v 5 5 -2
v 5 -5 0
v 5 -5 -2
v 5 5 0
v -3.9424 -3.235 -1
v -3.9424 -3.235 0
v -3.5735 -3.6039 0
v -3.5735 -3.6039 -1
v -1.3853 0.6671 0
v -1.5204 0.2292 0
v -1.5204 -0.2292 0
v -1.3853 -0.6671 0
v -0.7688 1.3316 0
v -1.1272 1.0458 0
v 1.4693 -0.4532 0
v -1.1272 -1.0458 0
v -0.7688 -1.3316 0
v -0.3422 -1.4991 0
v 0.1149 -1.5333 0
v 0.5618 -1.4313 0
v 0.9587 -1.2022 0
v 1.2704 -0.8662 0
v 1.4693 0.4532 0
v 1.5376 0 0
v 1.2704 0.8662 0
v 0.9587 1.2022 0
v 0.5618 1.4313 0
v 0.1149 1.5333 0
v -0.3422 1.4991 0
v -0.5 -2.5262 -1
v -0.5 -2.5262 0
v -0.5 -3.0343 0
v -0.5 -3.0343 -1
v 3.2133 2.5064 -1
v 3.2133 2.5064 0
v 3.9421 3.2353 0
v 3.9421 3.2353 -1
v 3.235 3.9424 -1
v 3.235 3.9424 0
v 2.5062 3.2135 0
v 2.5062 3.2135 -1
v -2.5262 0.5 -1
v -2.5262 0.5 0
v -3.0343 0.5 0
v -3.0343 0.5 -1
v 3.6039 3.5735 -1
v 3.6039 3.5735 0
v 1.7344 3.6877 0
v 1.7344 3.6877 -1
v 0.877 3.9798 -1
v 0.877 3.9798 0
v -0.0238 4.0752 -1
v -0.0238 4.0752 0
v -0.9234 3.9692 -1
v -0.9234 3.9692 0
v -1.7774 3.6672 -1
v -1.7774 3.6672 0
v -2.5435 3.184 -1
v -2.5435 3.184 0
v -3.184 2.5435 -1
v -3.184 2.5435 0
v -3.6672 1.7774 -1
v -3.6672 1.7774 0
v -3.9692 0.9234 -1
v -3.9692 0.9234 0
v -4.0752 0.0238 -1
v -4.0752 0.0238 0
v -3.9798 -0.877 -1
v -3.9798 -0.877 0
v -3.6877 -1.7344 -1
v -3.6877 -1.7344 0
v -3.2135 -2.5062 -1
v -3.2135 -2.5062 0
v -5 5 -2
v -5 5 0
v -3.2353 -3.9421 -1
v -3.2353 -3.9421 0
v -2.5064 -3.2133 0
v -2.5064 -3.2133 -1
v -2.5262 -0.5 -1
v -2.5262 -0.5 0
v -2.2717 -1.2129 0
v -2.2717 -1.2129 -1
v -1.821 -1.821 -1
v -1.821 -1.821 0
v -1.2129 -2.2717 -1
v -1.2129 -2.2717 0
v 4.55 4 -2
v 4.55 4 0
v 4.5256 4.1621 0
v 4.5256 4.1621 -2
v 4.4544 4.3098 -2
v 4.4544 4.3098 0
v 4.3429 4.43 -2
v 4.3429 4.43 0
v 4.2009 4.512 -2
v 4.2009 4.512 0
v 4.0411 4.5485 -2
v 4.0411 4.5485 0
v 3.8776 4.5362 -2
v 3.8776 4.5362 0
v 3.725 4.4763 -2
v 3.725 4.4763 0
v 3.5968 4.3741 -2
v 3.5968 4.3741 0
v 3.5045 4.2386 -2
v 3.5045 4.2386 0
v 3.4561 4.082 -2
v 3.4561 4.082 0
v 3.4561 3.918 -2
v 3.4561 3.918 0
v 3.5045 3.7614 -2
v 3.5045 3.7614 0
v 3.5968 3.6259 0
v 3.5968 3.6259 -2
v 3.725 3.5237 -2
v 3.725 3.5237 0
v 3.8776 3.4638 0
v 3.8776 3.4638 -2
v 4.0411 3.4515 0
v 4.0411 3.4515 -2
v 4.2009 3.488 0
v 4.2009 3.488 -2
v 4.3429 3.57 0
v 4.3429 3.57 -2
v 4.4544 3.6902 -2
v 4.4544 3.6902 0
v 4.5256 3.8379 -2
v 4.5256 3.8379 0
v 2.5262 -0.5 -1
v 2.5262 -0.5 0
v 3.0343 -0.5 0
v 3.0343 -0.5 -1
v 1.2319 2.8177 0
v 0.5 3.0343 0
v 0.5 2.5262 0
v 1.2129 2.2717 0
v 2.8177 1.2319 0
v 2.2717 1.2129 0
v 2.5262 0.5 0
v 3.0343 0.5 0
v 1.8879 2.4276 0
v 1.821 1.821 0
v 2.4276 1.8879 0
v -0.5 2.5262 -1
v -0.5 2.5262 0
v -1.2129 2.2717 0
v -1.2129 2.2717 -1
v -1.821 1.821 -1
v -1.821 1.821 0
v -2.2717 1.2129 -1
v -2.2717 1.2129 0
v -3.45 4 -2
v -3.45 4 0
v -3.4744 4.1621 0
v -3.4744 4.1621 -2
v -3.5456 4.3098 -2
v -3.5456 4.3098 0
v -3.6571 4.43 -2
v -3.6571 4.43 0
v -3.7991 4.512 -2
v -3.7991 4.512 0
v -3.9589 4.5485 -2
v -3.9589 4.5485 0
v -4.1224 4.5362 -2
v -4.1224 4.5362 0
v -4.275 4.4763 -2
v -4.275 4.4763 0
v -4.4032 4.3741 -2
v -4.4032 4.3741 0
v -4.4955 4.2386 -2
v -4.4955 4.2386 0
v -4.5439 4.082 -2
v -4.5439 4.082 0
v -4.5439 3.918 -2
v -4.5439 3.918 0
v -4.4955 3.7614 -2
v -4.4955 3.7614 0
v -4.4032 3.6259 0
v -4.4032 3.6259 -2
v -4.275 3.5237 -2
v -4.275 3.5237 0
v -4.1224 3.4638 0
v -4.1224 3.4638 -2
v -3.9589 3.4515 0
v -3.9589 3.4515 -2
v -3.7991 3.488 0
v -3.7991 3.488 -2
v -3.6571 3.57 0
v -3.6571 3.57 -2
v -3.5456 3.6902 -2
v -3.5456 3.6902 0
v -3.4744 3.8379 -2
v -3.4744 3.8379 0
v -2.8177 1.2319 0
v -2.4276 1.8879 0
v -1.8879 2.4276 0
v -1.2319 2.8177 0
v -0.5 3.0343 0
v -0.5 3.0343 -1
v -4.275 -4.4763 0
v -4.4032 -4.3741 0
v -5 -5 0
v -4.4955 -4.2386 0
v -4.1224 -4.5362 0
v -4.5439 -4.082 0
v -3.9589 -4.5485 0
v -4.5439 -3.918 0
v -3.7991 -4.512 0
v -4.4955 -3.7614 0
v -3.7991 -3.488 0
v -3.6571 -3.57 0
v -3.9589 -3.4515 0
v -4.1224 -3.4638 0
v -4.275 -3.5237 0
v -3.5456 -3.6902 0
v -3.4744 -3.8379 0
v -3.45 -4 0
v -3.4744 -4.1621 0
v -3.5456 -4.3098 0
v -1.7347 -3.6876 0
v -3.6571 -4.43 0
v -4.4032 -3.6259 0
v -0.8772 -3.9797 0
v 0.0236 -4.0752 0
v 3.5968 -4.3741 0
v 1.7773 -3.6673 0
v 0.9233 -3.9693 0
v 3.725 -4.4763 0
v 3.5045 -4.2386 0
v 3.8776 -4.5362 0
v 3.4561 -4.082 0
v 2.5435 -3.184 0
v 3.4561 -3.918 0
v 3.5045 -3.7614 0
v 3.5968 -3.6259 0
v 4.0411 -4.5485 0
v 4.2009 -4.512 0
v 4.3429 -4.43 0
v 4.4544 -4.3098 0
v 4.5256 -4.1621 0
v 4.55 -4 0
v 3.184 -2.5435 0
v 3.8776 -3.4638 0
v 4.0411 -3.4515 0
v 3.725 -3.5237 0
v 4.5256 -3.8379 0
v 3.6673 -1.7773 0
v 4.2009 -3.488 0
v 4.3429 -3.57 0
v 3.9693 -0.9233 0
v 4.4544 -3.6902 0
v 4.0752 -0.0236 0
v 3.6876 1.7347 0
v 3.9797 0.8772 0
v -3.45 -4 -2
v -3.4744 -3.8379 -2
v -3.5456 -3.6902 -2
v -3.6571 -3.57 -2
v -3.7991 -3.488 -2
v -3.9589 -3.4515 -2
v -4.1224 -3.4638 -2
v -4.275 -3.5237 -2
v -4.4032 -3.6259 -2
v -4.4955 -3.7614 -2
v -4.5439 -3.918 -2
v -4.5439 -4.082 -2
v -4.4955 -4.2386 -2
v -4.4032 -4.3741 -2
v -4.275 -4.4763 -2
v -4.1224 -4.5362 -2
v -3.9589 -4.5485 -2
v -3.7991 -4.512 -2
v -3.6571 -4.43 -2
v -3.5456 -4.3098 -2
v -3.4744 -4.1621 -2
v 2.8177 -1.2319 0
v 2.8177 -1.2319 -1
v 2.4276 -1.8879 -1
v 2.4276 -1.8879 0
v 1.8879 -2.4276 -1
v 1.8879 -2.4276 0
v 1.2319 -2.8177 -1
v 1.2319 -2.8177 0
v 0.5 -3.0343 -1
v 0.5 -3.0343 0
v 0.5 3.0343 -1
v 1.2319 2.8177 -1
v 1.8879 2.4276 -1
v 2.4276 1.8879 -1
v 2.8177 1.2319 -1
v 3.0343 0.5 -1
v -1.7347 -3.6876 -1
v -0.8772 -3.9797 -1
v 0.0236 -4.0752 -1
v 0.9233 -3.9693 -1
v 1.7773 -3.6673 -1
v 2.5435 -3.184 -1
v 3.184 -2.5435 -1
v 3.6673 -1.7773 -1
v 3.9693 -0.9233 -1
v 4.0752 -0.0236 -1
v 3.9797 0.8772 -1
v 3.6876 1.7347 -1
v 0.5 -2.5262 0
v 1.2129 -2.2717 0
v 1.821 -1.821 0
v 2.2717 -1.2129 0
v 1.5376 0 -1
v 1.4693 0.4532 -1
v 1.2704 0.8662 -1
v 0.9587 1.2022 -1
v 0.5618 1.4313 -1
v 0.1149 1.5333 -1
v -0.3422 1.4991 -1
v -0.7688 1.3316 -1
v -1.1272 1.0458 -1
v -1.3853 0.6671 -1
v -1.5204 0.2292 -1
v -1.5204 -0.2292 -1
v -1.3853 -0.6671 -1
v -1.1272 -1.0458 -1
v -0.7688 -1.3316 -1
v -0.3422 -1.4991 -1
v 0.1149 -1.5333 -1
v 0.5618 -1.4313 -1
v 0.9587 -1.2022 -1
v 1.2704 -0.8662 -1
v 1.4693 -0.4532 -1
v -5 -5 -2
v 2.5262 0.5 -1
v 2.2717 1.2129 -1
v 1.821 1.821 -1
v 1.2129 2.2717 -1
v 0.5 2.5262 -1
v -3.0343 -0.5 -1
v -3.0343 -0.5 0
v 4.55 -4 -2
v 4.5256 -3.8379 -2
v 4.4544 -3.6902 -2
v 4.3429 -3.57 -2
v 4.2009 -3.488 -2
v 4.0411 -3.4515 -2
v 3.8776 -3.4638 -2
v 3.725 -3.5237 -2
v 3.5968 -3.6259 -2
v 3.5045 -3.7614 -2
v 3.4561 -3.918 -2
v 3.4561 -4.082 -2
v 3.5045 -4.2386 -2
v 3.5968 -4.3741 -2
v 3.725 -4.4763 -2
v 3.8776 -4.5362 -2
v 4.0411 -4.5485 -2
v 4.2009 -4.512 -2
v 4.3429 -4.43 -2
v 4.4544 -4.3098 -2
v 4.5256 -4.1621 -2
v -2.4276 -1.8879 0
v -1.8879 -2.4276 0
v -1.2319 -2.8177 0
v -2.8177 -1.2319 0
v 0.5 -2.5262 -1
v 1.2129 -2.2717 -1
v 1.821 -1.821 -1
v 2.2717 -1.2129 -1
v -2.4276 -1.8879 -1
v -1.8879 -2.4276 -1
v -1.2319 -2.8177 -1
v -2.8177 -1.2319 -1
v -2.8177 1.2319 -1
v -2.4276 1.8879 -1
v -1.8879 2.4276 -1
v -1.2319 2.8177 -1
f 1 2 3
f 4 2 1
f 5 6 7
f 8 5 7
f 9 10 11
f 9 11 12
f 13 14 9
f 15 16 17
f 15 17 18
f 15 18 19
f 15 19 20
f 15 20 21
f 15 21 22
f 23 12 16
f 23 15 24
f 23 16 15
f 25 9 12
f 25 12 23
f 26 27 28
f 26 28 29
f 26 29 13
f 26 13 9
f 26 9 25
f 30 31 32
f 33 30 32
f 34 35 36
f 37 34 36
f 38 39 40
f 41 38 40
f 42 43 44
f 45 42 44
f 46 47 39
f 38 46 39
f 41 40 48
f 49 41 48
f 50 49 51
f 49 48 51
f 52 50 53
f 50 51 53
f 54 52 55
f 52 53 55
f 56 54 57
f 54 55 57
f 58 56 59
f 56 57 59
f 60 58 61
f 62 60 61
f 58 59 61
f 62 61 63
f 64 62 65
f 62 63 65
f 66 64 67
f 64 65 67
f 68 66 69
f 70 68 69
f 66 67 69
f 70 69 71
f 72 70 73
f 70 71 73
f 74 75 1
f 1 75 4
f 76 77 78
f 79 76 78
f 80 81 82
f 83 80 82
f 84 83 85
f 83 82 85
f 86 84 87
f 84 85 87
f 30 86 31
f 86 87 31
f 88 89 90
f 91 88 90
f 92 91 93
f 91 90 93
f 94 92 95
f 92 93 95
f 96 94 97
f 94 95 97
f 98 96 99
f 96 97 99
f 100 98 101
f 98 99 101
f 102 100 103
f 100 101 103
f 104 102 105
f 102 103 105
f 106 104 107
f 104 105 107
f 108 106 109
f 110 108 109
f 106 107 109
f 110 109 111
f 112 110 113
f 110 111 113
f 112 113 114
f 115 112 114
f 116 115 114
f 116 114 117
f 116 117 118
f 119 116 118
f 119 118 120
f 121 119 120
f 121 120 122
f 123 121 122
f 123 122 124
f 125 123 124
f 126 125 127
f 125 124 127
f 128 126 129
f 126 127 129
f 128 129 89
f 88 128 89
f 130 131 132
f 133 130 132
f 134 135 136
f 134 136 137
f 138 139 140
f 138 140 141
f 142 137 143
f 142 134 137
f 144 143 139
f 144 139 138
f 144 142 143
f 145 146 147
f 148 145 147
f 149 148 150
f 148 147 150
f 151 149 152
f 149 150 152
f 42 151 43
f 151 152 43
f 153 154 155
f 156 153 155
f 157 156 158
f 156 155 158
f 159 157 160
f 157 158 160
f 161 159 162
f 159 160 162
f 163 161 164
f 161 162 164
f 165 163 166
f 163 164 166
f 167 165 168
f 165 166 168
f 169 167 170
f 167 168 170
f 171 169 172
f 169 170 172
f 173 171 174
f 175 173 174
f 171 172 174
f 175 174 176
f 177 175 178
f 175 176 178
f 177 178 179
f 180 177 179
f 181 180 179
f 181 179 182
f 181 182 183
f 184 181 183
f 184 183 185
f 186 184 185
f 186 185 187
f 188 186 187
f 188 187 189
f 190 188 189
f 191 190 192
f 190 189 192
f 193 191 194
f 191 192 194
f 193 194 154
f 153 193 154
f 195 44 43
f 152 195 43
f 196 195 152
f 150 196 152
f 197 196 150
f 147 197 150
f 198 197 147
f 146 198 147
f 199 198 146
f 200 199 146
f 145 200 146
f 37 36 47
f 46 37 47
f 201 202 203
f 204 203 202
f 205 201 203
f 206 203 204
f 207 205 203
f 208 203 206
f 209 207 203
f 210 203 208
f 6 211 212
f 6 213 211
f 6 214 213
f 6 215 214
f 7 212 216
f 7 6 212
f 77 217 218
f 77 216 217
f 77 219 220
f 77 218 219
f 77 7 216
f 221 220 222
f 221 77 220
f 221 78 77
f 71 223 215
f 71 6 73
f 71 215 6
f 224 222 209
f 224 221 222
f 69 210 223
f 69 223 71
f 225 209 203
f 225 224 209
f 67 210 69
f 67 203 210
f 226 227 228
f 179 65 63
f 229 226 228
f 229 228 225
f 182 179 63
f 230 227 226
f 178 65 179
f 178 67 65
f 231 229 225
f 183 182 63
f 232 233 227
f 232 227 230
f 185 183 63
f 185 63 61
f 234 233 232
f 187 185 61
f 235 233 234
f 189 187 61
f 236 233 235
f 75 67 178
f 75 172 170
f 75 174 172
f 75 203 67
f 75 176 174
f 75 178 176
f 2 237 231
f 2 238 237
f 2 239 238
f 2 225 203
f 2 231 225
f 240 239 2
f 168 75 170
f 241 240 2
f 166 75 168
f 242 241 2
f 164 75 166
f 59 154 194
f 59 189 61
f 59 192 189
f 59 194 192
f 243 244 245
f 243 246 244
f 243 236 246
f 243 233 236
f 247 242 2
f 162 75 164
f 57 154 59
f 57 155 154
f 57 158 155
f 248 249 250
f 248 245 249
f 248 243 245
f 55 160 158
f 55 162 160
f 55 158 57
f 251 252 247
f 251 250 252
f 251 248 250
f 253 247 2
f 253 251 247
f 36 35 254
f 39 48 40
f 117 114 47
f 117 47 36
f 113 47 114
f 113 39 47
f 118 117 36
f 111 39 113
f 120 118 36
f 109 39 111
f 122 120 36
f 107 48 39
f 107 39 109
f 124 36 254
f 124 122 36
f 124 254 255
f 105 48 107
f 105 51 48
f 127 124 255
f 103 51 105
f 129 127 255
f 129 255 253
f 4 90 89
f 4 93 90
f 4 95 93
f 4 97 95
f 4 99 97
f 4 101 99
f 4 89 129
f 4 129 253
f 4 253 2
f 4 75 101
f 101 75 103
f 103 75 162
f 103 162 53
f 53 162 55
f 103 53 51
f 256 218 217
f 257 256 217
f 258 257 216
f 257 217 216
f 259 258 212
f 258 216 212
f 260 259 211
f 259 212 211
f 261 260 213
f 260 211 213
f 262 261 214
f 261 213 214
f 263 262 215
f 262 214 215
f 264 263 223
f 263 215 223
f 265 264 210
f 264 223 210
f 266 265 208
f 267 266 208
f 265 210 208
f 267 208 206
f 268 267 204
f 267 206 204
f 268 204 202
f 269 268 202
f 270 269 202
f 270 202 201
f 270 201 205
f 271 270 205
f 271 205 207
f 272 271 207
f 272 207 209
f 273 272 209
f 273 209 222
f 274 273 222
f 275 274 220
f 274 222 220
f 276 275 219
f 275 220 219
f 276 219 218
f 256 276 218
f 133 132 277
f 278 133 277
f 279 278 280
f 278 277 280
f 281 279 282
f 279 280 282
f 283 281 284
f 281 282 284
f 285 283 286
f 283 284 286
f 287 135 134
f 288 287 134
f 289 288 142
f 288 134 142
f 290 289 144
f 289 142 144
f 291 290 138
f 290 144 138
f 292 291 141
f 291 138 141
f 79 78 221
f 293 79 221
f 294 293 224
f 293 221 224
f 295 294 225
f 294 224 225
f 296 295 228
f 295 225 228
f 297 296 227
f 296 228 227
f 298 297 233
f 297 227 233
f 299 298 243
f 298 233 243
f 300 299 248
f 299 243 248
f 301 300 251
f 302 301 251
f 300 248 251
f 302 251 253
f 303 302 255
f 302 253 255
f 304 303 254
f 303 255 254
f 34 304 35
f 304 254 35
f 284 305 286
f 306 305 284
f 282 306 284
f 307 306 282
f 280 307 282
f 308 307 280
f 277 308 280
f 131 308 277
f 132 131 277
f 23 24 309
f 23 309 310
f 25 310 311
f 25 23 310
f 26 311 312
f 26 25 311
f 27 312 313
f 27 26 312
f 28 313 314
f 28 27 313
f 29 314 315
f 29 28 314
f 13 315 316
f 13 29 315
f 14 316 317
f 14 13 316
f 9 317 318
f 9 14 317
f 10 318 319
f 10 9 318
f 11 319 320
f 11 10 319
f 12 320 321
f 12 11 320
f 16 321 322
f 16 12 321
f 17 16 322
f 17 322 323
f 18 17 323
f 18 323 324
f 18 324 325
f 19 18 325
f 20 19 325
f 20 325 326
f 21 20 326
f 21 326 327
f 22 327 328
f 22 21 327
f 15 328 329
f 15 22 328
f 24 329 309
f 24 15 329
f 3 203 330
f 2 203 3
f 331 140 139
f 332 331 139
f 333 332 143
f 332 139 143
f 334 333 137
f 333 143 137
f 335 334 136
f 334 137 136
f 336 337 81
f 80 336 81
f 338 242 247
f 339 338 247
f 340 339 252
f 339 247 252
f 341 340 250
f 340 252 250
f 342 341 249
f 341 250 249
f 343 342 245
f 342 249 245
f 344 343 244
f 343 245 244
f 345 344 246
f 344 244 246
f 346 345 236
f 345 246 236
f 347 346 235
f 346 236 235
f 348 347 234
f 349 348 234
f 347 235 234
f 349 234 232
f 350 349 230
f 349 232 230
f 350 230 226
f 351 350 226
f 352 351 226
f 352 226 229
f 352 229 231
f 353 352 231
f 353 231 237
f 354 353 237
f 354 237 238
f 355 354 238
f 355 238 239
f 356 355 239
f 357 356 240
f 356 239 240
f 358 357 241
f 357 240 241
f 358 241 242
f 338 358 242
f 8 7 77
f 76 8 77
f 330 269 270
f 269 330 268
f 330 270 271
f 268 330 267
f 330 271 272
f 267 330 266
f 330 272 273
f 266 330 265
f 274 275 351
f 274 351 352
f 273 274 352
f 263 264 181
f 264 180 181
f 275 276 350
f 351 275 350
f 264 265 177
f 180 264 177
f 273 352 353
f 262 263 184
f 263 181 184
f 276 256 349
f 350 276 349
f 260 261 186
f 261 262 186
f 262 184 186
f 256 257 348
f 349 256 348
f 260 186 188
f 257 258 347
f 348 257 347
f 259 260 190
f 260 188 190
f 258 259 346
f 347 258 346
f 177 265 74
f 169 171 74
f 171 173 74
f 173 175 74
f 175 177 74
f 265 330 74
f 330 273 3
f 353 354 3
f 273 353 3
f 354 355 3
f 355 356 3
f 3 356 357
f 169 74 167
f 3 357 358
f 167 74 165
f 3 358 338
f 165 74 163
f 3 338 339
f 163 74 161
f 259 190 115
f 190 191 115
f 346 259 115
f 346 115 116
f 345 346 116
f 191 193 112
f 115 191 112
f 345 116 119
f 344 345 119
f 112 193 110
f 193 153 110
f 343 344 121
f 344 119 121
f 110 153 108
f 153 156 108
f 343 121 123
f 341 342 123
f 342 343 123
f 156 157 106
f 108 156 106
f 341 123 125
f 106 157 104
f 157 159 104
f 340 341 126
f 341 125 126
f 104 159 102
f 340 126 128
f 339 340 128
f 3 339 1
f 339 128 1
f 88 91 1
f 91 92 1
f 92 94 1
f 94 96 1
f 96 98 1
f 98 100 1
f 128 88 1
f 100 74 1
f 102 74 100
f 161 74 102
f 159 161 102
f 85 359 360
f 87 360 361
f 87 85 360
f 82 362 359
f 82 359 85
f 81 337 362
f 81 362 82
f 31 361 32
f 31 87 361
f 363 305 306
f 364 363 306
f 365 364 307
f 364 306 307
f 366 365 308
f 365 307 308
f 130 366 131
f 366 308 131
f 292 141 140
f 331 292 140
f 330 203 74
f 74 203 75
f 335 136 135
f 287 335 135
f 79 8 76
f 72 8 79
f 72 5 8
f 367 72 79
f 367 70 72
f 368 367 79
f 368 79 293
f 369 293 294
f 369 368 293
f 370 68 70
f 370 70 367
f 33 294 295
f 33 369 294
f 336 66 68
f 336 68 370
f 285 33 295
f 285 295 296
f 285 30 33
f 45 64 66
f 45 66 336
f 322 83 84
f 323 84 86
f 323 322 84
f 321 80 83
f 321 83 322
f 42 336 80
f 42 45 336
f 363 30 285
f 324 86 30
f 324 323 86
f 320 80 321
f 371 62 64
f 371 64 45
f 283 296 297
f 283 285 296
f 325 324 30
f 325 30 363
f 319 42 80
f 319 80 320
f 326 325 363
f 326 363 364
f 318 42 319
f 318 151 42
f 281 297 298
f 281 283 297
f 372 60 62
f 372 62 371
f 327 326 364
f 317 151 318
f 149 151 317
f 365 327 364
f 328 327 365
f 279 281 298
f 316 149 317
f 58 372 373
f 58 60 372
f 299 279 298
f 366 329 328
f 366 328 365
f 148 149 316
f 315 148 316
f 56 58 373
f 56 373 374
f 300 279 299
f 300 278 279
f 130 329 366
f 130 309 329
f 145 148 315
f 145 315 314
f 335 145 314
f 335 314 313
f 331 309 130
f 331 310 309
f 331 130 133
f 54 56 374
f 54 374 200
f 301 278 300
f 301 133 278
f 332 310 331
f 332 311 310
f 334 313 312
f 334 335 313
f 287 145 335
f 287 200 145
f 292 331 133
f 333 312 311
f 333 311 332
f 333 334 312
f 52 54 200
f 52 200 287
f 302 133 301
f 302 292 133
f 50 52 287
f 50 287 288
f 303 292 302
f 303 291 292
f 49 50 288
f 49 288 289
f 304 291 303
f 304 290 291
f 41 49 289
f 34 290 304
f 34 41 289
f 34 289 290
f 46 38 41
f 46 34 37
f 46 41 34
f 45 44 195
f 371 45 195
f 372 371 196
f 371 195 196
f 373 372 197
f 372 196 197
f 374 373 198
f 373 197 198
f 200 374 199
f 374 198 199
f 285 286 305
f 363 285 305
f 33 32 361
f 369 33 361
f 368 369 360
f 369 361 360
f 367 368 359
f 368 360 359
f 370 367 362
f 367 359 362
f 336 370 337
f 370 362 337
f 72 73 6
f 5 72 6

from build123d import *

# Parameters (mm, degrees)
F0_W     = 10
F0_H     = 10
F0_R     = 0.55
F0_R_2   = 1.537619
F1_DEPTH = 2
F2_DEPTH = 1


with BuildPart() as f1:
    # F0 (on Top) → F1 (new body)
    with BuildSketch(Plane.XY):
        Rectangle(F0_W, F0_H)
        with Locations((-4, -4)):
            Circle(F0_R, mode=Mode.SUBTRACT)
        with Locations((4, -4)):
            Circle(F0_R, mode=Mode.SUBTRACT)
        with Locations((-4, 4)):
            Circle(F0_R, mode=Mode.SUBTRACT)
        with BuildLine():
            ThreePointArc((-3.213514, -2.50617), (-2.881628, 2.881628), (2.50617, 3.213514))
            Line((2.50617, 3.213514), (3.235023, 3.942367))
            Line((3.235023, 3.942367), (3.603887, 3.573503))
            Line((3.603887, 3.573503), (3.942129, 3.23526))
            Line((3.942129, 3.23526), (3.213306, 2.506437))
            ThreePointArc((3.213306, 2.506437), (2.881628, -2.881628), (-2.506437, -3.213306))
            Line((-2.506437, -3.213306), (-3.23526, -3.942129))
            Line((-3.23526, -3.942129), (-3.573503, -3.603887))
            Line((-3.573503, -3.603887), (-3.942367, -3.235023))
            Line((-3.942367, -3.235023), (-3.213514, -2.50617))
        make_face(mode=Mode.SUBTRACT)
        with Locations((4, 4)):
            Circle(F0_R, mode=Mode.SUBTRACT)
        with BuildLine():
            Line((3.235023, 3.942367), (2.50617, 3.213514))
            ThreePointArc((2.50617, 3.213514), (-2.881628, 2.881628), (-3.213514, -2.50617))
            Line((-3.213514, -2.50617), (-3.942367, -3.235023))
            Line((-3.942367, -3.235023), (-3.573503, -3.603887))
            Line((-3.573503, -3.603887), (-3.23526, -3.942129))
            Line((-3.23526, -3.942129), (-2.506437, -3.213306))
            ThreePointArc((-2.506437, -3.213306), (2.881628, -2.881628), (3.213306, 2.506437))
            Line((3.213306, 2.506437), (3.942129, 3.23526))
            Line((3.942129, 3.23526), (3.603887, 3.573503))
            Line((3.603887, 3.573503), (3.235023, 3.942367))
        make_face()
        with BuildLine():
            Line((-3.034318, -0.5), (-2.526232, -0.5))
            ThreePointArc((-2.526232, -0.5), (-1.820968, -1.820968), (-0.5, -2.526232))
            Line((-0.5, -2.526232), (-0.5, -3.034318))
            ThreePointArc((-0.5, -3.034318), (-2.174521, -2.174521), (-3.034318, -0.5))
        make_face(mode=Mode.SUBTRACT)
        with BuildLine():
            ThreePointArc((0.5, -2.526232), (1.820968, -1.820968), (2.526232, -0.5))
            Line((2.526232, -0.5), (3.034318, -0.5))
            ThreePointArc((3.034318, -0.5), (2.174521, -2.174521), (0.5, -3.034318))
            Line((0.5, -3.034318), (0.5, -2.526232))
        make_face(mode=Mode.SUBTRACT)
        with BuildLine():
            ThreePointArc((-0.5, 2.526232), (-1.820968, 1.820968), (-2.526232, 0.5))
            Line((-2.526232, 0.5), (-3.034318, 0.5))
            ThreePointArc((-3.034318, 0.5), (-2.174521, 2.174521), (-0.5, 3.034318))
            Line((-0.5, 3.034318), (-0.5, 2.526232))
        make_face(mode=Mode.SUBTRACT)
        Circle(F0_R_2, mode=Mode.SUBTRACT)
        with BuildLine():
            Line((3.034318, 0.5), (2.526232, 0.5))
            ThreePointArc((2.526232, 0.5), (1.820968, 1.820968), (0.5, 2.526232))
            Line((0.5, 2.526232), (0.5, 3.034318))
            ThreePointArc((0.5, 3.034318), (2.174521, 2.174521), (3.034318, 0.5))
        make_face(mode=Mode.SUBTRACT)
        with BuildLine():
            ThreePointArc((-0.5, -2.526232), (-1.820968, -1.820968), (-2.526232, -0.5))
            Line((-2.526232, -0.5), (-3.034318, -0.5))
            ThreePointArc((-3.034318, -0.5), (-2.174521, -2.174521), (-0.5, -3.034318))
            Line((-0.5, -3.034318), (-0.5, -2.526232))
        make_face()
        with BuildLine():
            Line((-3.034318, 0.5), (-2.526232, 0.5))
            ThreePointArc((-2.526232, 0.5), (-1.820968, 1.820968), (-0.5, 2.526232))
            Line((-0.5, 2.526232), (-0.5, 3.034318))
            ThreePointArc((-0.5, 3.034318), (-2.174521, 2.174521), (-3.034318, 0.5))
        make_face()
        with BuildLine():
            ThreePointArc((0.5, 2.526232), (1.820968, 1.820968), (2.526232, 0.5))
            Line((2.526232, 0.5), (3.034318, 0.5))
            ThreePointArc((3.034318, 0.5), (2.174521, 2.174521), (0.5, 3.034318))
            Line((0.5, 3.034318), (0.5, 2.526232))
        make_face()
        with BuildLine():
            Line((3.034318, -0.5), (2.526232, -0.5))
            ThreePointArc((2.526232, -0.5), (1.820968, -1.820968), (0.5, -2.526232))
            Line((0.5, -2.526232), (0.5, -3.034318))
            ThreePointArc((0.5, -3.034318), (2.174521, -2.174521), (3.034318, -0.5))
        make_face()
        Circle(F0_R_2)
    extrude(amount=-F1_DEPTH)

    # F0 (on Top) → F2 (cut)
    with BuildSketch(Plane.XY):
        with BuildLine():
            Line((3.235023, 3.942367), (2.50617, 3.213514))
            ThreePointArc((2.50617, 3.213514), (-2.881628, 2.881628), (-3.213514, -2.50617))
            Line((-3.213514, -2.50617), (-3.942367, -3.235023))
            Line((-3.942367, -3.235023), (-3.573503, -3.603887))
            Line((-3.573503, -3.603887), (-3.23526, -3.942129))
            Line((-3.23526, -3.942129), (-2.506437, -3.213306))
            ThreePointArc((-2.506437, -3.213306), (2.881628, -2.881628), (3.213306, 2.506437))
            Line((3.213306, 2.506437), (3.942129, 3.23526))
            Line((3.942129, 3.23526), (3.603887, 3.573503))
            Line((3.603887, 3.573503), (3.235023, 3.942367))
        make_face()
        with BuildLine():
            Line((-3.034318, -0.5), (-2.526232, -0.5))
            ThreePointArc((-2.526232, -0.5), (-1.820968, -1.820968), (-0.5, -2.526232))
            Line((-0.5, -2.526232), (-0.5, -3.034318))
            ThreePointArc((-0.5, -3.034318), (-2.174521, -2.174521), (-3.034318, -0.5))
        make_face(mode=Mode.SUBTRACT)
        with BuildLine():
            ThreePointArc((0.5, -2.526232), (1.820968, -1.820968), (2.526232, -0.5))
            Line((2.526232, -0.5), (3.034318, -0.5))
            ThreePointArc((3.034318, -0.5), (2.174521, -2.174521), (0.5, -3.034318))
            Line((0.5, -3.034318), (0.5, -2.526232))
        make_face(mode=Mode.SUBTRACT)
        with BuildLine():
            ThreePointArc((-0.5, 2.526232), (-1.820968, 1.820968), (-2.526232, 0.5))
            Line((-2.526232, 0.5), (-3.034318, 0.5))
            ThreePointArc((-3.034318, 0.5), (-2.174521, 2.174521), (-0.5, 3.034318))
            Line((-0.5, 3.034318), (-0.5, 2.526232))
        make_face(mode=Mode.SUBTRACT)
        Circle(F0_R_2, mode=Mode.SUBTRACT)
        with BuildLine():
            Line((3.034318, 0.5), (2.526232, 0.5))
            ThreePointArc((2.526232, 0.5), (1.820968, 1.820968), (0.5, 2.526232))
            Line((0.5, 2.526232), (0.5, 3.034318))
            ThreePointArc((0.5, 3.034318), (2.174521, 2.174521), (3.034318, 0.5))
        make_face(mode=Mode.SUBTRACT)
    extrude(amount=-F2_DEPTH, mode=Mode.SUBTRACT)


solid = f1.part
